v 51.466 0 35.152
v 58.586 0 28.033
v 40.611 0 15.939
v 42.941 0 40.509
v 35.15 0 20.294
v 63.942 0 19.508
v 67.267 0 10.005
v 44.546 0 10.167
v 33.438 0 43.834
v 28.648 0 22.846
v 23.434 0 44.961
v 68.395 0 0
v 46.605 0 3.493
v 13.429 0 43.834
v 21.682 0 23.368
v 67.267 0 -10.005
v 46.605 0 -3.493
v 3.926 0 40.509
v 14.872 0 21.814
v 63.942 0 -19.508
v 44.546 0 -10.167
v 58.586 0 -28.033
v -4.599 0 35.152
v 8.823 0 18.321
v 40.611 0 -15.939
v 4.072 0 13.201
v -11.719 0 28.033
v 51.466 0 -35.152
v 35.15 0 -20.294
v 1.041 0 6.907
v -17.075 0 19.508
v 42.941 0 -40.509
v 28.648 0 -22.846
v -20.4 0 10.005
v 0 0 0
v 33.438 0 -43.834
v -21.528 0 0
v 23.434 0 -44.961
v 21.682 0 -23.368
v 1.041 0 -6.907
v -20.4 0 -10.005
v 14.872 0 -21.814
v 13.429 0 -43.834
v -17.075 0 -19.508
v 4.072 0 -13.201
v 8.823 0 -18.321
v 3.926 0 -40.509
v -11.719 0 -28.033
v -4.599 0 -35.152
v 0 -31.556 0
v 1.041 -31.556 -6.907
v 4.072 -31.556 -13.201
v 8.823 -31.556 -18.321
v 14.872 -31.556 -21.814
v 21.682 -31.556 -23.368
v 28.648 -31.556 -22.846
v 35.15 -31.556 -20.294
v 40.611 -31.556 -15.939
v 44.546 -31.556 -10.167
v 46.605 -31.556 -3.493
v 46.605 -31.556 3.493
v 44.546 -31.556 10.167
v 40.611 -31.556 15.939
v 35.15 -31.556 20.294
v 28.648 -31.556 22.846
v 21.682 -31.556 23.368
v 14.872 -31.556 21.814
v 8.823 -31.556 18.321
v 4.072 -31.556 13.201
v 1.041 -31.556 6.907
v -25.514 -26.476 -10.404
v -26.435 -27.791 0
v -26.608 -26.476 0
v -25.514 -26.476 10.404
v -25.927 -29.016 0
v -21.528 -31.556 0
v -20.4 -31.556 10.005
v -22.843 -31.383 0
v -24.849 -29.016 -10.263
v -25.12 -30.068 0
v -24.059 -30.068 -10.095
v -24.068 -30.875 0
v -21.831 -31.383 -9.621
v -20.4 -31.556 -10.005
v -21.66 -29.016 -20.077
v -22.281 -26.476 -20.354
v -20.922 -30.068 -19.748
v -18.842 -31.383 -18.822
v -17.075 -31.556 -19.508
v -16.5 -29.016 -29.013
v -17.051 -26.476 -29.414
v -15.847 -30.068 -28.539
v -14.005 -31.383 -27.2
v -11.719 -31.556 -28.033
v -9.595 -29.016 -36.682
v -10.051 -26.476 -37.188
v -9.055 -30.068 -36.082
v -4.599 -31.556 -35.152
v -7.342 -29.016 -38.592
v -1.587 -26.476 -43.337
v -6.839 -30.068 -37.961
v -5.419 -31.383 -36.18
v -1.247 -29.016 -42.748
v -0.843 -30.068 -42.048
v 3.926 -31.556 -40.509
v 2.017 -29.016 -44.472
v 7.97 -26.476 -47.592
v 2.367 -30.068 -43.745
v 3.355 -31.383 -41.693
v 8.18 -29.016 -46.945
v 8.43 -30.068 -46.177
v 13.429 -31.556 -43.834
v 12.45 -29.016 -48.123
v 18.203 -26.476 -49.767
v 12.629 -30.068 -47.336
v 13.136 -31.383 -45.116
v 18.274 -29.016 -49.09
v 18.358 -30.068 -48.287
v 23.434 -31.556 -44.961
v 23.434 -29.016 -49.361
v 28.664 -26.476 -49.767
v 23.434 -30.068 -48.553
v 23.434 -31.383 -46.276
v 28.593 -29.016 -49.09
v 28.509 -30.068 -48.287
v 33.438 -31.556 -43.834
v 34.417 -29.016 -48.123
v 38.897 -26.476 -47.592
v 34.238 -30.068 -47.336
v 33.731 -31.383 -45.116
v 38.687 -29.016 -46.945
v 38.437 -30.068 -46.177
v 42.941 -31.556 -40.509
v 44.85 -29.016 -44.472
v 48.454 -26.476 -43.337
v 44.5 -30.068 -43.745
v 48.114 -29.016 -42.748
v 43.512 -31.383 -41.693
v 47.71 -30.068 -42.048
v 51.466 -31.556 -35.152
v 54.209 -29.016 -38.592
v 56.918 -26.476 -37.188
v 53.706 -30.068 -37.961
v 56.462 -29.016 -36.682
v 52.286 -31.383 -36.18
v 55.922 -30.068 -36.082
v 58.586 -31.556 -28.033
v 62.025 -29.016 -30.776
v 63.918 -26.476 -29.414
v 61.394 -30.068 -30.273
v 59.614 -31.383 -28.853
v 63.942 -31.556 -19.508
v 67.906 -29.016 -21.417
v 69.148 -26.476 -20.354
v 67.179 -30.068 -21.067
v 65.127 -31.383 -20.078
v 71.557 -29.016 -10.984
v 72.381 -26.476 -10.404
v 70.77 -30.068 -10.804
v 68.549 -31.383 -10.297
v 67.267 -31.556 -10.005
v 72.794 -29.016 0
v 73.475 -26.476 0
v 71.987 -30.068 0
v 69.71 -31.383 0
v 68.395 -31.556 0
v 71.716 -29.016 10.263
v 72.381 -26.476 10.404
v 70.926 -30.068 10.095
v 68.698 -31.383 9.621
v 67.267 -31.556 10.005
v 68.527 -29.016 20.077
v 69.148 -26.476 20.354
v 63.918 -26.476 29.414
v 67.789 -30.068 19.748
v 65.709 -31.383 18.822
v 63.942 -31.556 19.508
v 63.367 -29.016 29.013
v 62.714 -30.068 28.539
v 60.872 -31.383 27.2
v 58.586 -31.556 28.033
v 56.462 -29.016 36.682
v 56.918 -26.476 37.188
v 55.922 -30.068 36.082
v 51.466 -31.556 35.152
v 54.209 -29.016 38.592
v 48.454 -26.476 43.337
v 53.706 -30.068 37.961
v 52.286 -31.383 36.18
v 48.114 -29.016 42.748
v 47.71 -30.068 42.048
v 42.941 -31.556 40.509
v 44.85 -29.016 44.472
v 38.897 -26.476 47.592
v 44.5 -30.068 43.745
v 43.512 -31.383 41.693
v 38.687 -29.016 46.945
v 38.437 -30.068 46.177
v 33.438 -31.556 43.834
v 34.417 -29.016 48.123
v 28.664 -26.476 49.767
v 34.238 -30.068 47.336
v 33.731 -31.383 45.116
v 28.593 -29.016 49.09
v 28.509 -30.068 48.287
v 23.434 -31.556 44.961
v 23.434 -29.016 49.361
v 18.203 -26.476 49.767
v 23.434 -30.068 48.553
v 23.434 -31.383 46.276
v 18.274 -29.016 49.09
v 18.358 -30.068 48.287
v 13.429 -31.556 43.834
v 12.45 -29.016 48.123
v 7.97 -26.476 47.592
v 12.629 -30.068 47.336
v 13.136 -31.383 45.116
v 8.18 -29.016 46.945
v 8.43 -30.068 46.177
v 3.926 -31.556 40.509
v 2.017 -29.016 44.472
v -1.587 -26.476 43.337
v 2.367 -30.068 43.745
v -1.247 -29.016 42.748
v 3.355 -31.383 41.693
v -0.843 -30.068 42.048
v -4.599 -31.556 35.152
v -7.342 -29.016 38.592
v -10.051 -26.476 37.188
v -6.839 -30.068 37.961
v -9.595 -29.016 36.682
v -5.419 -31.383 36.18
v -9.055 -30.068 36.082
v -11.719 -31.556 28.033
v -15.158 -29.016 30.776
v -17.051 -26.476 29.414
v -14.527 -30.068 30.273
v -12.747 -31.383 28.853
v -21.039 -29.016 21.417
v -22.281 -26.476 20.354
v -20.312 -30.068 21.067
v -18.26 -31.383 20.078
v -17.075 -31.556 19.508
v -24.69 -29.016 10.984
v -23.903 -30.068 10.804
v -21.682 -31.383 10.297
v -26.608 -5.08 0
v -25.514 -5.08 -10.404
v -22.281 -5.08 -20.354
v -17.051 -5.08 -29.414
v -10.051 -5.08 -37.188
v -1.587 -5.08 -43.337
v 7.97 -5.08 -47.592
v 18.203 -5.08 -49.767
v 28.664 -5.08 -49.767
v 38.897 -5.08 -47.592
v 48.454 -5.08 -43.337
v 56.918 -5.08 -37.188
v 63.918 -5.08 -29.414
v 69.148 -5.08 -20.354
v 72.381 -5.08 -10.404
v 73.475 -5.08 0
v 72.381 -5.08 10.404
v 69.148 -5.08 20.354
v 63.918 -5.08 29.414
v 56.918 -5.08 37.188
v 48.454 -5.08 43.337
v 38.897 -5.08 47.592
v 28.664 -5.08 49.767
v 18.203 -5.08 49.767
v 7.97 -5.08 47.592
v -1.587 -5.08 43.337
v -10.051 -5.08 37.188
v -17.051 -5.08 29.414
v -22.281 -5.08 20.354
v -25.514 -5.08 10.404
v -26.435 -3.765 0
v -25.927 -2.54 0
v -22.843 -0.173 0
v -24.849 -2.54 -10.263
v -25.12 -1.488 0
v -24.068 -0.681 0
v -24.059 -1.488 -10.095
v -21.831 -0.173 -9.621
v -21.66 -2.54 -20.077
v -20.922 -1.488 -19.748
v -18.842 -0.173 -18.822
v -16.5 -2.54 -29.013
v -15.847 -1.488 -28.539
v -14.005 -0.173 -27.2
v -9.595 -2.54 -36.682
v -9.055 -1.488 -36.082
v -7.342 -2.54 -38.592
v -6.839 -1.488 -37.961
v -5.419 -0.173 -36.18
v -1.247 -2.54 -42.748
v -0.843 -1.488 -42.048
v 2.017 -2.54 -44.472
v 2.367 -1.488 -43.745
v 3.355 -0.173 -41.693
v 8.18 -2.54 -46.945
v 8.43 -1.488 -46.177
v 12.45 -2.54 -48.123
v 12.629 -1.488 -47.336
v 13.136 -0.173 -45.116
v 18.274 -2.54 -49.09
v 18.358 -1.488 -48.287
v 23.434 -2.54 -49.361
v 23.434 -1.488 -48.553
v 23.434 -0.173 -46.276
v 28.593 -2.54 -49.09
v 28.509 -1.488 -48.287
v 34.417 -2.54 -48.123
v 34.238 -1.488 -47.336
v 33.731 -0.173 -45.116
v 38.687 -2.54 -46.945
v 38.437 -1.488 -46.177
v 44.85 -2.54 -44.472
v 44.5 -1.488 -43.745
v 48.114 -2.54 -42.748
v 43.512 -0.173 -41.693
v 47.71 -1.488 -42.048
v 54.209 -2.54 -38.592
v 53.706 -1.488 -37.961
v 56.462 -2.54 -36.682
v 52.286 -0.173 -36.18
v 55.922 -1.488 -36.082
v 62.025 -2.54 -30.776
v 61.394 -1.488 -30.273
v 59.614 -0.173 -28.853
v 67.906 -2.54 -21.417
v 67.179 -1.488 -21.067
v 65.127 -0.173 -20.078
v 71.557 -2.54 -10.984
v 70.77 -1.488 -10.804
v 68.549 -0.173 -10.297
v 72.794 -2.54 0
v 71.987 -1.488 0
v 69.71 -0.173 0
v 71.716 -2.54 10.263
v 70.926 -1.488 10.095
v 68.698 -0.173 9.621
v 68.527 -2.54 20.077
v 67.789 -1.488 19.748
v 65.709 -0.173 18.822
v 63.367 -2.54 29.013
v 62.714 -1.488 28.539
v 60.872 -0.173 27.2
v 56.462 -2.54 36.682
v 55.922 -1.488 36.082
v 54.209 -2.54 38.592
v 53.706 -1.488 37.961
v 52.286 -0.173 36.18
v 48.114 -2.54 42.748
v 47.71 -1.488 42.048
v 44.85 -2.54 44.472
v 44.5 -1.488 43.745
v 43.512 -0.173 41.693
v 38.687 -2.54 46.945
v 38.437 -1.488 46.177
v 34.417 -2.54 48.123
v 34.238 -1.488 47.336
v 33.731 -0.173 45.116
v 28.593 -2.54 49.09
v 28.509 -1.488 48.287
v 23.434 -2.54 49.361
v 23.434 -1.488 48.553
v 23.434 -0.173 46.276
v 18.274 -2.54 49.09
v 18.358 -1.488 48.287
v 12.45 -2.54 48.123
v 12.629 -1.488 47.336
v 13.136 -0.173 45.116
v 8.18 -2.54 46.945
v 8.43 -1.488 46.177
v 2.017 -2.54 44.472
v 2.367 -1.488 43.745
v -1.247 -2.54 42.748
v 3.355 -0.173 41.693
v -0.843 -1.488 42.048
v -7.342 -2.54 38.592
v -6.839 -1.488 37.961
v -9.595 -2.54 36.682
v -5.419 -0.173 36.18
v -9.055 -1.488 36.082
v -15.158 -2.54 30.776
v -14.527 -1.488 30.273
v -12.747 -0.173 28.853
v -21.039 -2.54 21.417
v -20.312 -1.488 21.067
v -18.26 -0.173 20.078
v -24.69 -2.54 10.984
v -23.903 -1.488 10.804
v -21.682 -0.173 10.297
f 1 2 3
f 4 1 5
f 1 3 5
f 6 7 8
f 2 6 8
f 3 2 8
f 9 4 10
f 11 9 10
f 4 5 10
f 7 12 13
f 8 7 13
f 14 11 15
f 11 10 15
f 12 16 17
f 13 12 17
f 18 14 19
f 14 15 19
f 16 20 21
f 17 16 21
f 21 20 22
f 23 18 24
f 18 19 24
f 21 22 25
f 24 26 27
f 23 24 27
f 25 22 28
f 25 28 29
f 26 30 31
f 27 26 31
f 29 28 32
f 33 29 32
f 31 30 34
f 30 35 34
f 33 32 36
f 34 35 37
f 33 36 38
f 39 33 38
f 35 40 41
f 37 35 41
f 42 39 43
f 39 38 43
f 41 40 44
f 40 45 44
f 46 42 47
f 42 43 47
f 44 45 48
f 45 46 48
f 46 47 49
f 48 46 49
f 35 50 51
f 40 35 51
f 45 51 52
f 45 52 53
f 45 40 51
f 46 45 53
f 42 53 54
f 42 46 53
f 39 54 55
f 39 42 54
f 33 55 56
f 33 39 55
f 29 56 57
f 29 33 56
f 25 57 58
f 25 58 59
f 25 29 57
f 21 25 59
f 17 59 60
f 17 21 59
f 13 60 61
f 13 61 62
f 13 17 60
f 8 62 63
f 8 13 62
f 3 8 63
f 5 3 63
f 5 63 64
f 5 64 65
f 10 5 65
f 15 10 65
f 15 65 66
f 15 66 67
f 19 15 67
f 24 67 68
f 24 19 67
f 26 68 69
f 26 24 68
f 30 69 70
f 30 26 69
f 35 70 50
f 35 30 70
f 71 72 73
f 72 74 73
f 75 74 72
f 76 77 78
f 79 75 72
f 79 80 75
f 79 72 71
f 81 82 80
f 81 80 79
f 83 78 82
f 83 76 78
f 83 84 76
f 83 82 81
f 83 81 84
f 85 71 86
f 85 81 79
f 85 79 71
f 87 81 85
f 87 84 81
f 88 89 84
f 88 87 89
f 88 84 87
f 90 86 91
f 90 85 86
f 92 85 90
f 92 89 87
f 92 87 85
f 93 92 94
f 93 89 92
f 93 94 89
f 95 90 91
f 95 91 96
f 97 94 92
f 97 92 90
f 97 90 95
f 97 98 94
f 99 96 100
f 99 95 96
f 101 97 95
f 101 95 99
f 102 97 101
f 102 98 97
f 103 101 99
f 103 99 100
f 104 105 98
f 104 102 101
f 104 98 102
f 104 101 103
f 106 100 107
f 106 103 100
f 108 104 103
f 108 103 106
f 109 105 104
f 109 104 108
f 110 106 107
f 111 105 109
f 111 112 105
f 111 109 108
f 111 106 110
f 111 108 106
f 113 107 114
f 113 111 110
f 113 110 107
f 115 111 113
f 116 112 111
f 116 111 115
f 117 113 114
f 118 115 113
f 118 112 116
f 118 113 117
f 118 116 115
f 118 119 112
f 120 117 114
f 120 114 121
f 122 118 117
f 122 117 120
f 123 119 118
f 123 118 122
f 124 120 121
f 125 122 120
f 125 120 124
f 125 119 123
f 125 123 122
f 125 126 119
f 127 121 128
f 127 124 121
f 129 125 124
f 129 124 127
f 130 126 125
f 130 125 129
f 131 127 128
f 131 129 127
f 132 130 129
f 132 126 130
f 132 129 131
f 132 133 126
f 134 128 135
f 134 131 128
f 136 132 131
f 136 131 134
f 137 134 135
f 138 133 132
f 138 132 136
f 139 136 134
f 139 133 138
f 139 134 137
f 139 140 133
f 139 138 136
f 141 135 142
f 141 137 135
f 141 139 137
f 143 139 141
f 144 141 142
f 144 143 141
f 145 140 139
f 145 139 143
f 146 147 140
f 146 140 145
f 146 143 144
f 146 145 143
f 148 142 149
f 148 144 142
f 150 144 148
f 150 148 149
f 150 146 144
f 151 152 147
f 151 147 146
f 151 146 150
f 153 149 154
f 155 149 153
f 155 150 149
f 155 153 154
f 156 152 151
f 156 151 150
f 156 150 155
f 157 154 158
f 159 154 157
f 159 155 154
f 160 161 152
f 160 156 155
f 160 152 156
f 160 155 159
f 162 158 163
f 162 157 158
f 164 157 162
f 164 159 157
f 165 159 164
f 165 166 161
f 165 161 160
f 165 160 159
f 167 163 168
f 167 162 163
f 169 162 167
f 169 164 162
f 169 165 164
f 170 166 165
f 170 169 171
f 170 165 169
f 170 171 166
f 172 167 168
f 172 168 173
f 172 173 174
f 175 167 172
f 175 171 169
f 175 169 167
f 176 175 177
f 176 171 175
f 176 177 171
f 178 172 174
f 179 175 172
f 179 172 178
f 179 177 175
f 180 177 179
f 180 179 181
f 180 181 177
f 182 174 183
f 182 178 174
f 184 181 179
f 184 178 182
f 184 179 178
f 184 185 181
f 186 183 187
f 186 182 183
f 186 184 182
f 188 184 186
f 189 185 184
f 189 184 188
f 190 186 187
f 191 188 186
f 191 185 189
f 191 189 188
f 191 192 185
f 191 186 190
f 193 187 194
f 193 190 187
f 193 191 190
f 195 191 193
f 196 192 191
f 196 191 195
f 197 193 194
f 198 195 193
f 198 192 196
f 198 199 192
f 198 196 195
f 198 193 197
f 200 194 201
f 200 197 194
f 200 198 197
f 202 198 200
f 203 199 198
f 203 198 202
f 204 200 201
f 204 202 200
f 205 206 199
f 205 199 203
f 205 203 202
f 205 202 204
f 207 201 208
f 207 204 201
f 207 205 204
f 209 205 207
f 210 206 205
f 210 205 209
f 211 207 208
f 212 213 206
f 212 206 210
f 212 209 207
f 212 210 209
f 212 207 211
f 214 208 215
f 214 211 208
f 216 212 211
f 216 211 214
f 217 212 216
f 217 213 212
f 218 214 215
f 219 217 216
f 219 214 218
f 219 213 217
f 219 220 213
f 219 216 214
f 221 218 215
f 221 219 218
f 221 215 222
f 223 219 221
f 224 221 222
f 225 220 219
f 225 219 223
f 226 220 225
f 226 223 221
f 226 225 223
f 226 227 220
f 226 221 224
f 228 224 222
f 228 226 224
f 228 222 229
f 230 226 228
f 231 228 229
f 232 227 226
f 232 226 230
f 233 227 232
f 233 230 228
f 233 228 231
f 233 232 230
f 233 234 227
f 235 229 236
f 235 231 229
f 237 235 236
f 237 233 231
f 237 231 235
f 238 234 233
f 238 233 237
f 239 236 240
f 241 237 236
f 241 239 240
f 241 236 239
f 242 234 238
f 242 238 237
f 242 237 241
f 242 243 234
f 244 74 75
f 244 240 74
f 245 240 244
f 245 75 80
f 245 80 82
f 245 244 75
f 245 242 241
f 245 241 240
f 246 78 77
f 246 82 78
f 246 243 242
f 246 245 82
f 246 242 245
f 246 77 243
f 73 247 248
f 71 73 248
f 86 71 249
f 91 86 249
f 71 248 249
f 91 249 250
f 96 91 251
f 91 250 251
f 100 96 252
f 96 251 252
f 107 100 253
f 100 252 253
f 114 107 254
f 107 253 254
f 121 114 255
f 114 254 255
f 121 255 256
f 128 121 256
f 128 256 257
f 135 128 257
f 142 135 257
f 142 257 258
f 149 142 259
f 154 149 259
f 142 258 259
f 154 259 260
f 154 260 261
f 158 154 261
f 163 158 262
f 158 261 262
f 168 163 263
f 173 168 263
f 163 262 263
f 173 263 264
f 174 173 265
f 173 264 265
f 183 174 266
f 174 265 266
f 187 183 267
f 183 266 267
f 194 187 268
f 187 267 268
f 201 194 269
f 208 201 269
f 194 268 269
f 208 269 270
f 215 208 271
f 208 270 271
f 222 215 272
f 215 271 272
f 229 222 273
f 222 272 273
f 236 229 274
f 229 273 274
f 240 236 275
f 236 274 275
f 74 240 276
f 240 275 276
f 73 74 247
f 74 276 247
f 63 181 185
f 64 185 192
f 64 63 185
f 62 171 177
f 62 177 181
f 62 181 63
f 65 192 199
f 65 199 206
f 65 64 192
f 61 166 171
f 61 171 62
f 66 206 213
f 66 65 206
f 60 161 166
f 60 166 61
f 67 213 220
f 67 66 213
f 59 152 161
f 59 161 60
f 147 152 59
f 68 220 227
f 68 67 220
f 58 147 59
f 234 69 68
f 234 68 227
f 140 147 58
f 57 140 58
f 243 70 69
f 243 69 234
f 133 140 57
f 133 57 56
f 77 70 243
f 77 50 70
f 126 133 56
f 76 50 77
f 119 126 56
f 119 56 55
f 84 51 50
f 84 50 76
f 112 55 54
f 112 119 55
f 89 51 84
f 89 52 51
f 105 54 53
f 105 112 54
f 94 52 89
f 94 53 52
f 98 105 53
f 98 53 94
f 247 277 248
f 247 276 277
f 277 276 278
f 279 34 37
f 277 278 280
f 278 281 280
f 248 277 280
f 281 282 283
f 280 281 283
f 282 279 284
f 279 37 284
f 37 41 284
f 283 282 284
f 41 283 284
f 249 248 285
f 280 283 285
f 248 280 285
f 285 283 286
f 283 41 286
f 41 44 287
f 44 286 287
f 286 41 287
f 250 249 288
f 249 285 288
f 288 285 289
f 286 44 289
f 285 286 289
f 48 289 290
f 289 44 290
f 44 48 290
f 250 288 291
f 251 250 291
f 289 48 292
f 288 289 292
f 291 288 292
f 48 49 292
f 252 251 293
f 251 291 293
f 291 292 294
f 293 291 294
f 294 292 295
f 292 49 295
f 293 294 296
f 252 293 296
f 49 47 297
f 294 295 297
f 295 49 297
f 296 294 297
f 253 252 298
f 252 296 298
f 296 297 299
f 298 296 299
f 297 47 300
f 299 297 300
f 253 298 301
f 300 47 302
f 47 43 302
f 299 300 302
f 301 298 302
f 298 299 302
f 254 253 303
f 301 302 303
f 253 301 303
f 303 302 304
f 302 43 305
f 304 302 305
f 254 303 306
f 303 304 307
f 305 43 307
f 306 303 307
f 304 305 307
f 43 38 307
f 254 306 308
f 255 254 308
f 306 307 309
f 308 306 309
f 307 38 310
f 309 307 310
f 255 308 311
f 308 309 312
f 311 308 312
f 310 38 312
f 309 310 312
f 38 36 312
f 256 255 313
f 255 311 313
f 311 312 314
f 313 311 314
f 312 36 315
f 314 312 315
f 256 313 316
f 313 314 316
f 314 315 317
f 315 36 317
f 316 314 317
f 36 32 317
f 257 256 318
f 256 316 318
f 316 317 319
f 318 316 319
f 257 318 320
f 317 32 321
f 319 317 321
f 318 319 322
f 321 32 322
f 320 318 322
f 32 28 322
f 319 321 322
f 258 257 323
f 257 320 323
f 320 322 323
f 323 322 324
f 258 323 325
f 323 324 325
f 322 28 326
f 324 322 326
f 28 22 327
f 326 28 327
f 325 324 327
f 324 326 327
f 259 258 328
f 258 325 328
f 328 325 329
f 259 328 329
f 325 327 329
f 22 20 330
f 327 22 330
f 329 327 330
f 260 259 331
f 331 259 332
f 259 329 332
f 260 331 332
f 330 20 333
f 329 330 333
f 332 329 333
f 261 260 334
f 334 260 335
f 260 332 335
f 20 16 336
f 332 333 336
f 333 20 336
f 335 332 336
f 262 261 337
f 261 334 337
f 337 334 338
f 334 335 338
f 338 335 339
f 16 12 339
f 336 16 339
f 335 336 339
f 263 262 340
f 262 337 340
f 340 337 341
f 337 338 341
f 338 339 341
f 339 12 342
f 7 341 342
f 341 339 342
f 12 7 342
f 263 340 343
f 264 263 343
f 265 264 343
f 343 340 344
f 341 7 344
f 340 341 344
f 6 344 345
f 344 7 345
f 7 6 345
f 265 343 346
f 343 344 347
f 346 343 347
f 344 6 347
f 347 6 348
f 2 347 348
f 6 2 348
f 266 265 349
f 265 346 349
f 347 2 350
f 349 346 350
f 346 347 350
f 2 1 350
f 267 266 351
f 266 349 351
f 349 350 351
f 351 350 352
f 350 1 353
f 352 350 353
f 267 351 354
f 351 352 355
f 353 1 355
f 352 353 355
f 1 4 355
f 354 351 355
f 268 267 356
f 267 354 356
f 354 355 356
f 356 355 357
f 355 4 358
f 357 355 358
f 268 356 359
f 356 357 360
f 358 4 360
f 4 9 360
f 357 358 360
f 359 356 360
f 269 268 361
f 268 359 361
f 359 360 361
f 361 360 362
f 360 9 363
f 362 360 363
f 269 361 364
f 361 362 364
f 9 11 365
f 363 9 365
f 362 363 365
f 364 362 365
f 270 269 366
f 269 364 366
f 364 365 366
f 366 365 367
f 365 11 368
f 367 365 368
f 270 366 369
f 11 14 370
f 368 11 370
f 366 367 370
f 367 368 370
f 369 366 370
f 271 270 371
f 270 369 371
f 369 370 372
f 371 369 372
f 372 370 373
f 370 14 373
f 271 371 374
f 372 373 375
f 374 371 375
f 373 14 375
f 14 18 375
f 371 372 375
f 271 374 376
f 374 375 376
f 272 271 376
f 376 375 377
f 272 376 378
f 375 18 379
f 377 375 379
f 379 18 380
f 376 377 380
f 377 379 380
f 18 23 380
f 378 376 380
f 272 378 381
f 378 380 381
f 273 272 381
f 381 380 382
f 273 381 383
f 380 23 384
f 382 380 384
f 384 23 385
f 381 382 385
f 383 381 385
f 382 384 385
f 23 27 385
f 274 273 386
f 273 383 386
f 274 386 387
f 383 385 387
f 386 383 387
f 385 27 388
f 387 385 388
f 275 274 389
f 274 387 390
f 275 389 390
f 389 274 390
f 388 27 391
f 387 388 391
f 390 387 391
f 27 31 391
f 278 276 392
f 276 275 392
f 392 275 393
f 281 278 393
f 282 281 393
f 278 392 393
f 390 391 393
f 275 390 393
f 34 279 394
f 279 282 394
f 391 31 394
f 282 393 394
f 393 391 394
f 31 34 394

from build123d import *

# Parameters (mm, degrees)
F0_W = 26.6077592969
F0_H = 31.5558686852
F3_R = 5.08
F4_R = 5.08


with BuildPart() as f2:
    # F0 (on Top) → F2 (revolve)
    with BuildSketch(Plane.XY):
        with Locations((-13.3038796484, -15.7779343426)):
            Rectangle(F0_W, F0_H)
    revolve(axis=Axis((23.4335027635, -18.3920301497, 0), (0, -1, 0)))

    # F3
    f3_edges = [f2.edges().sort_by_distance(p)[0] for p in [
        (73.474765, 0, 0),
    ]]
    fillet(f3_edges, radius=F3_R)

    # F4
    f4_edges = [f2.edges().sort_by_distance(p)[0] for p in [
        (73.474765, -31.555869, 0),
    ]]
    fillet(f4_edges, radius=F4_R)


solid = f2.part
